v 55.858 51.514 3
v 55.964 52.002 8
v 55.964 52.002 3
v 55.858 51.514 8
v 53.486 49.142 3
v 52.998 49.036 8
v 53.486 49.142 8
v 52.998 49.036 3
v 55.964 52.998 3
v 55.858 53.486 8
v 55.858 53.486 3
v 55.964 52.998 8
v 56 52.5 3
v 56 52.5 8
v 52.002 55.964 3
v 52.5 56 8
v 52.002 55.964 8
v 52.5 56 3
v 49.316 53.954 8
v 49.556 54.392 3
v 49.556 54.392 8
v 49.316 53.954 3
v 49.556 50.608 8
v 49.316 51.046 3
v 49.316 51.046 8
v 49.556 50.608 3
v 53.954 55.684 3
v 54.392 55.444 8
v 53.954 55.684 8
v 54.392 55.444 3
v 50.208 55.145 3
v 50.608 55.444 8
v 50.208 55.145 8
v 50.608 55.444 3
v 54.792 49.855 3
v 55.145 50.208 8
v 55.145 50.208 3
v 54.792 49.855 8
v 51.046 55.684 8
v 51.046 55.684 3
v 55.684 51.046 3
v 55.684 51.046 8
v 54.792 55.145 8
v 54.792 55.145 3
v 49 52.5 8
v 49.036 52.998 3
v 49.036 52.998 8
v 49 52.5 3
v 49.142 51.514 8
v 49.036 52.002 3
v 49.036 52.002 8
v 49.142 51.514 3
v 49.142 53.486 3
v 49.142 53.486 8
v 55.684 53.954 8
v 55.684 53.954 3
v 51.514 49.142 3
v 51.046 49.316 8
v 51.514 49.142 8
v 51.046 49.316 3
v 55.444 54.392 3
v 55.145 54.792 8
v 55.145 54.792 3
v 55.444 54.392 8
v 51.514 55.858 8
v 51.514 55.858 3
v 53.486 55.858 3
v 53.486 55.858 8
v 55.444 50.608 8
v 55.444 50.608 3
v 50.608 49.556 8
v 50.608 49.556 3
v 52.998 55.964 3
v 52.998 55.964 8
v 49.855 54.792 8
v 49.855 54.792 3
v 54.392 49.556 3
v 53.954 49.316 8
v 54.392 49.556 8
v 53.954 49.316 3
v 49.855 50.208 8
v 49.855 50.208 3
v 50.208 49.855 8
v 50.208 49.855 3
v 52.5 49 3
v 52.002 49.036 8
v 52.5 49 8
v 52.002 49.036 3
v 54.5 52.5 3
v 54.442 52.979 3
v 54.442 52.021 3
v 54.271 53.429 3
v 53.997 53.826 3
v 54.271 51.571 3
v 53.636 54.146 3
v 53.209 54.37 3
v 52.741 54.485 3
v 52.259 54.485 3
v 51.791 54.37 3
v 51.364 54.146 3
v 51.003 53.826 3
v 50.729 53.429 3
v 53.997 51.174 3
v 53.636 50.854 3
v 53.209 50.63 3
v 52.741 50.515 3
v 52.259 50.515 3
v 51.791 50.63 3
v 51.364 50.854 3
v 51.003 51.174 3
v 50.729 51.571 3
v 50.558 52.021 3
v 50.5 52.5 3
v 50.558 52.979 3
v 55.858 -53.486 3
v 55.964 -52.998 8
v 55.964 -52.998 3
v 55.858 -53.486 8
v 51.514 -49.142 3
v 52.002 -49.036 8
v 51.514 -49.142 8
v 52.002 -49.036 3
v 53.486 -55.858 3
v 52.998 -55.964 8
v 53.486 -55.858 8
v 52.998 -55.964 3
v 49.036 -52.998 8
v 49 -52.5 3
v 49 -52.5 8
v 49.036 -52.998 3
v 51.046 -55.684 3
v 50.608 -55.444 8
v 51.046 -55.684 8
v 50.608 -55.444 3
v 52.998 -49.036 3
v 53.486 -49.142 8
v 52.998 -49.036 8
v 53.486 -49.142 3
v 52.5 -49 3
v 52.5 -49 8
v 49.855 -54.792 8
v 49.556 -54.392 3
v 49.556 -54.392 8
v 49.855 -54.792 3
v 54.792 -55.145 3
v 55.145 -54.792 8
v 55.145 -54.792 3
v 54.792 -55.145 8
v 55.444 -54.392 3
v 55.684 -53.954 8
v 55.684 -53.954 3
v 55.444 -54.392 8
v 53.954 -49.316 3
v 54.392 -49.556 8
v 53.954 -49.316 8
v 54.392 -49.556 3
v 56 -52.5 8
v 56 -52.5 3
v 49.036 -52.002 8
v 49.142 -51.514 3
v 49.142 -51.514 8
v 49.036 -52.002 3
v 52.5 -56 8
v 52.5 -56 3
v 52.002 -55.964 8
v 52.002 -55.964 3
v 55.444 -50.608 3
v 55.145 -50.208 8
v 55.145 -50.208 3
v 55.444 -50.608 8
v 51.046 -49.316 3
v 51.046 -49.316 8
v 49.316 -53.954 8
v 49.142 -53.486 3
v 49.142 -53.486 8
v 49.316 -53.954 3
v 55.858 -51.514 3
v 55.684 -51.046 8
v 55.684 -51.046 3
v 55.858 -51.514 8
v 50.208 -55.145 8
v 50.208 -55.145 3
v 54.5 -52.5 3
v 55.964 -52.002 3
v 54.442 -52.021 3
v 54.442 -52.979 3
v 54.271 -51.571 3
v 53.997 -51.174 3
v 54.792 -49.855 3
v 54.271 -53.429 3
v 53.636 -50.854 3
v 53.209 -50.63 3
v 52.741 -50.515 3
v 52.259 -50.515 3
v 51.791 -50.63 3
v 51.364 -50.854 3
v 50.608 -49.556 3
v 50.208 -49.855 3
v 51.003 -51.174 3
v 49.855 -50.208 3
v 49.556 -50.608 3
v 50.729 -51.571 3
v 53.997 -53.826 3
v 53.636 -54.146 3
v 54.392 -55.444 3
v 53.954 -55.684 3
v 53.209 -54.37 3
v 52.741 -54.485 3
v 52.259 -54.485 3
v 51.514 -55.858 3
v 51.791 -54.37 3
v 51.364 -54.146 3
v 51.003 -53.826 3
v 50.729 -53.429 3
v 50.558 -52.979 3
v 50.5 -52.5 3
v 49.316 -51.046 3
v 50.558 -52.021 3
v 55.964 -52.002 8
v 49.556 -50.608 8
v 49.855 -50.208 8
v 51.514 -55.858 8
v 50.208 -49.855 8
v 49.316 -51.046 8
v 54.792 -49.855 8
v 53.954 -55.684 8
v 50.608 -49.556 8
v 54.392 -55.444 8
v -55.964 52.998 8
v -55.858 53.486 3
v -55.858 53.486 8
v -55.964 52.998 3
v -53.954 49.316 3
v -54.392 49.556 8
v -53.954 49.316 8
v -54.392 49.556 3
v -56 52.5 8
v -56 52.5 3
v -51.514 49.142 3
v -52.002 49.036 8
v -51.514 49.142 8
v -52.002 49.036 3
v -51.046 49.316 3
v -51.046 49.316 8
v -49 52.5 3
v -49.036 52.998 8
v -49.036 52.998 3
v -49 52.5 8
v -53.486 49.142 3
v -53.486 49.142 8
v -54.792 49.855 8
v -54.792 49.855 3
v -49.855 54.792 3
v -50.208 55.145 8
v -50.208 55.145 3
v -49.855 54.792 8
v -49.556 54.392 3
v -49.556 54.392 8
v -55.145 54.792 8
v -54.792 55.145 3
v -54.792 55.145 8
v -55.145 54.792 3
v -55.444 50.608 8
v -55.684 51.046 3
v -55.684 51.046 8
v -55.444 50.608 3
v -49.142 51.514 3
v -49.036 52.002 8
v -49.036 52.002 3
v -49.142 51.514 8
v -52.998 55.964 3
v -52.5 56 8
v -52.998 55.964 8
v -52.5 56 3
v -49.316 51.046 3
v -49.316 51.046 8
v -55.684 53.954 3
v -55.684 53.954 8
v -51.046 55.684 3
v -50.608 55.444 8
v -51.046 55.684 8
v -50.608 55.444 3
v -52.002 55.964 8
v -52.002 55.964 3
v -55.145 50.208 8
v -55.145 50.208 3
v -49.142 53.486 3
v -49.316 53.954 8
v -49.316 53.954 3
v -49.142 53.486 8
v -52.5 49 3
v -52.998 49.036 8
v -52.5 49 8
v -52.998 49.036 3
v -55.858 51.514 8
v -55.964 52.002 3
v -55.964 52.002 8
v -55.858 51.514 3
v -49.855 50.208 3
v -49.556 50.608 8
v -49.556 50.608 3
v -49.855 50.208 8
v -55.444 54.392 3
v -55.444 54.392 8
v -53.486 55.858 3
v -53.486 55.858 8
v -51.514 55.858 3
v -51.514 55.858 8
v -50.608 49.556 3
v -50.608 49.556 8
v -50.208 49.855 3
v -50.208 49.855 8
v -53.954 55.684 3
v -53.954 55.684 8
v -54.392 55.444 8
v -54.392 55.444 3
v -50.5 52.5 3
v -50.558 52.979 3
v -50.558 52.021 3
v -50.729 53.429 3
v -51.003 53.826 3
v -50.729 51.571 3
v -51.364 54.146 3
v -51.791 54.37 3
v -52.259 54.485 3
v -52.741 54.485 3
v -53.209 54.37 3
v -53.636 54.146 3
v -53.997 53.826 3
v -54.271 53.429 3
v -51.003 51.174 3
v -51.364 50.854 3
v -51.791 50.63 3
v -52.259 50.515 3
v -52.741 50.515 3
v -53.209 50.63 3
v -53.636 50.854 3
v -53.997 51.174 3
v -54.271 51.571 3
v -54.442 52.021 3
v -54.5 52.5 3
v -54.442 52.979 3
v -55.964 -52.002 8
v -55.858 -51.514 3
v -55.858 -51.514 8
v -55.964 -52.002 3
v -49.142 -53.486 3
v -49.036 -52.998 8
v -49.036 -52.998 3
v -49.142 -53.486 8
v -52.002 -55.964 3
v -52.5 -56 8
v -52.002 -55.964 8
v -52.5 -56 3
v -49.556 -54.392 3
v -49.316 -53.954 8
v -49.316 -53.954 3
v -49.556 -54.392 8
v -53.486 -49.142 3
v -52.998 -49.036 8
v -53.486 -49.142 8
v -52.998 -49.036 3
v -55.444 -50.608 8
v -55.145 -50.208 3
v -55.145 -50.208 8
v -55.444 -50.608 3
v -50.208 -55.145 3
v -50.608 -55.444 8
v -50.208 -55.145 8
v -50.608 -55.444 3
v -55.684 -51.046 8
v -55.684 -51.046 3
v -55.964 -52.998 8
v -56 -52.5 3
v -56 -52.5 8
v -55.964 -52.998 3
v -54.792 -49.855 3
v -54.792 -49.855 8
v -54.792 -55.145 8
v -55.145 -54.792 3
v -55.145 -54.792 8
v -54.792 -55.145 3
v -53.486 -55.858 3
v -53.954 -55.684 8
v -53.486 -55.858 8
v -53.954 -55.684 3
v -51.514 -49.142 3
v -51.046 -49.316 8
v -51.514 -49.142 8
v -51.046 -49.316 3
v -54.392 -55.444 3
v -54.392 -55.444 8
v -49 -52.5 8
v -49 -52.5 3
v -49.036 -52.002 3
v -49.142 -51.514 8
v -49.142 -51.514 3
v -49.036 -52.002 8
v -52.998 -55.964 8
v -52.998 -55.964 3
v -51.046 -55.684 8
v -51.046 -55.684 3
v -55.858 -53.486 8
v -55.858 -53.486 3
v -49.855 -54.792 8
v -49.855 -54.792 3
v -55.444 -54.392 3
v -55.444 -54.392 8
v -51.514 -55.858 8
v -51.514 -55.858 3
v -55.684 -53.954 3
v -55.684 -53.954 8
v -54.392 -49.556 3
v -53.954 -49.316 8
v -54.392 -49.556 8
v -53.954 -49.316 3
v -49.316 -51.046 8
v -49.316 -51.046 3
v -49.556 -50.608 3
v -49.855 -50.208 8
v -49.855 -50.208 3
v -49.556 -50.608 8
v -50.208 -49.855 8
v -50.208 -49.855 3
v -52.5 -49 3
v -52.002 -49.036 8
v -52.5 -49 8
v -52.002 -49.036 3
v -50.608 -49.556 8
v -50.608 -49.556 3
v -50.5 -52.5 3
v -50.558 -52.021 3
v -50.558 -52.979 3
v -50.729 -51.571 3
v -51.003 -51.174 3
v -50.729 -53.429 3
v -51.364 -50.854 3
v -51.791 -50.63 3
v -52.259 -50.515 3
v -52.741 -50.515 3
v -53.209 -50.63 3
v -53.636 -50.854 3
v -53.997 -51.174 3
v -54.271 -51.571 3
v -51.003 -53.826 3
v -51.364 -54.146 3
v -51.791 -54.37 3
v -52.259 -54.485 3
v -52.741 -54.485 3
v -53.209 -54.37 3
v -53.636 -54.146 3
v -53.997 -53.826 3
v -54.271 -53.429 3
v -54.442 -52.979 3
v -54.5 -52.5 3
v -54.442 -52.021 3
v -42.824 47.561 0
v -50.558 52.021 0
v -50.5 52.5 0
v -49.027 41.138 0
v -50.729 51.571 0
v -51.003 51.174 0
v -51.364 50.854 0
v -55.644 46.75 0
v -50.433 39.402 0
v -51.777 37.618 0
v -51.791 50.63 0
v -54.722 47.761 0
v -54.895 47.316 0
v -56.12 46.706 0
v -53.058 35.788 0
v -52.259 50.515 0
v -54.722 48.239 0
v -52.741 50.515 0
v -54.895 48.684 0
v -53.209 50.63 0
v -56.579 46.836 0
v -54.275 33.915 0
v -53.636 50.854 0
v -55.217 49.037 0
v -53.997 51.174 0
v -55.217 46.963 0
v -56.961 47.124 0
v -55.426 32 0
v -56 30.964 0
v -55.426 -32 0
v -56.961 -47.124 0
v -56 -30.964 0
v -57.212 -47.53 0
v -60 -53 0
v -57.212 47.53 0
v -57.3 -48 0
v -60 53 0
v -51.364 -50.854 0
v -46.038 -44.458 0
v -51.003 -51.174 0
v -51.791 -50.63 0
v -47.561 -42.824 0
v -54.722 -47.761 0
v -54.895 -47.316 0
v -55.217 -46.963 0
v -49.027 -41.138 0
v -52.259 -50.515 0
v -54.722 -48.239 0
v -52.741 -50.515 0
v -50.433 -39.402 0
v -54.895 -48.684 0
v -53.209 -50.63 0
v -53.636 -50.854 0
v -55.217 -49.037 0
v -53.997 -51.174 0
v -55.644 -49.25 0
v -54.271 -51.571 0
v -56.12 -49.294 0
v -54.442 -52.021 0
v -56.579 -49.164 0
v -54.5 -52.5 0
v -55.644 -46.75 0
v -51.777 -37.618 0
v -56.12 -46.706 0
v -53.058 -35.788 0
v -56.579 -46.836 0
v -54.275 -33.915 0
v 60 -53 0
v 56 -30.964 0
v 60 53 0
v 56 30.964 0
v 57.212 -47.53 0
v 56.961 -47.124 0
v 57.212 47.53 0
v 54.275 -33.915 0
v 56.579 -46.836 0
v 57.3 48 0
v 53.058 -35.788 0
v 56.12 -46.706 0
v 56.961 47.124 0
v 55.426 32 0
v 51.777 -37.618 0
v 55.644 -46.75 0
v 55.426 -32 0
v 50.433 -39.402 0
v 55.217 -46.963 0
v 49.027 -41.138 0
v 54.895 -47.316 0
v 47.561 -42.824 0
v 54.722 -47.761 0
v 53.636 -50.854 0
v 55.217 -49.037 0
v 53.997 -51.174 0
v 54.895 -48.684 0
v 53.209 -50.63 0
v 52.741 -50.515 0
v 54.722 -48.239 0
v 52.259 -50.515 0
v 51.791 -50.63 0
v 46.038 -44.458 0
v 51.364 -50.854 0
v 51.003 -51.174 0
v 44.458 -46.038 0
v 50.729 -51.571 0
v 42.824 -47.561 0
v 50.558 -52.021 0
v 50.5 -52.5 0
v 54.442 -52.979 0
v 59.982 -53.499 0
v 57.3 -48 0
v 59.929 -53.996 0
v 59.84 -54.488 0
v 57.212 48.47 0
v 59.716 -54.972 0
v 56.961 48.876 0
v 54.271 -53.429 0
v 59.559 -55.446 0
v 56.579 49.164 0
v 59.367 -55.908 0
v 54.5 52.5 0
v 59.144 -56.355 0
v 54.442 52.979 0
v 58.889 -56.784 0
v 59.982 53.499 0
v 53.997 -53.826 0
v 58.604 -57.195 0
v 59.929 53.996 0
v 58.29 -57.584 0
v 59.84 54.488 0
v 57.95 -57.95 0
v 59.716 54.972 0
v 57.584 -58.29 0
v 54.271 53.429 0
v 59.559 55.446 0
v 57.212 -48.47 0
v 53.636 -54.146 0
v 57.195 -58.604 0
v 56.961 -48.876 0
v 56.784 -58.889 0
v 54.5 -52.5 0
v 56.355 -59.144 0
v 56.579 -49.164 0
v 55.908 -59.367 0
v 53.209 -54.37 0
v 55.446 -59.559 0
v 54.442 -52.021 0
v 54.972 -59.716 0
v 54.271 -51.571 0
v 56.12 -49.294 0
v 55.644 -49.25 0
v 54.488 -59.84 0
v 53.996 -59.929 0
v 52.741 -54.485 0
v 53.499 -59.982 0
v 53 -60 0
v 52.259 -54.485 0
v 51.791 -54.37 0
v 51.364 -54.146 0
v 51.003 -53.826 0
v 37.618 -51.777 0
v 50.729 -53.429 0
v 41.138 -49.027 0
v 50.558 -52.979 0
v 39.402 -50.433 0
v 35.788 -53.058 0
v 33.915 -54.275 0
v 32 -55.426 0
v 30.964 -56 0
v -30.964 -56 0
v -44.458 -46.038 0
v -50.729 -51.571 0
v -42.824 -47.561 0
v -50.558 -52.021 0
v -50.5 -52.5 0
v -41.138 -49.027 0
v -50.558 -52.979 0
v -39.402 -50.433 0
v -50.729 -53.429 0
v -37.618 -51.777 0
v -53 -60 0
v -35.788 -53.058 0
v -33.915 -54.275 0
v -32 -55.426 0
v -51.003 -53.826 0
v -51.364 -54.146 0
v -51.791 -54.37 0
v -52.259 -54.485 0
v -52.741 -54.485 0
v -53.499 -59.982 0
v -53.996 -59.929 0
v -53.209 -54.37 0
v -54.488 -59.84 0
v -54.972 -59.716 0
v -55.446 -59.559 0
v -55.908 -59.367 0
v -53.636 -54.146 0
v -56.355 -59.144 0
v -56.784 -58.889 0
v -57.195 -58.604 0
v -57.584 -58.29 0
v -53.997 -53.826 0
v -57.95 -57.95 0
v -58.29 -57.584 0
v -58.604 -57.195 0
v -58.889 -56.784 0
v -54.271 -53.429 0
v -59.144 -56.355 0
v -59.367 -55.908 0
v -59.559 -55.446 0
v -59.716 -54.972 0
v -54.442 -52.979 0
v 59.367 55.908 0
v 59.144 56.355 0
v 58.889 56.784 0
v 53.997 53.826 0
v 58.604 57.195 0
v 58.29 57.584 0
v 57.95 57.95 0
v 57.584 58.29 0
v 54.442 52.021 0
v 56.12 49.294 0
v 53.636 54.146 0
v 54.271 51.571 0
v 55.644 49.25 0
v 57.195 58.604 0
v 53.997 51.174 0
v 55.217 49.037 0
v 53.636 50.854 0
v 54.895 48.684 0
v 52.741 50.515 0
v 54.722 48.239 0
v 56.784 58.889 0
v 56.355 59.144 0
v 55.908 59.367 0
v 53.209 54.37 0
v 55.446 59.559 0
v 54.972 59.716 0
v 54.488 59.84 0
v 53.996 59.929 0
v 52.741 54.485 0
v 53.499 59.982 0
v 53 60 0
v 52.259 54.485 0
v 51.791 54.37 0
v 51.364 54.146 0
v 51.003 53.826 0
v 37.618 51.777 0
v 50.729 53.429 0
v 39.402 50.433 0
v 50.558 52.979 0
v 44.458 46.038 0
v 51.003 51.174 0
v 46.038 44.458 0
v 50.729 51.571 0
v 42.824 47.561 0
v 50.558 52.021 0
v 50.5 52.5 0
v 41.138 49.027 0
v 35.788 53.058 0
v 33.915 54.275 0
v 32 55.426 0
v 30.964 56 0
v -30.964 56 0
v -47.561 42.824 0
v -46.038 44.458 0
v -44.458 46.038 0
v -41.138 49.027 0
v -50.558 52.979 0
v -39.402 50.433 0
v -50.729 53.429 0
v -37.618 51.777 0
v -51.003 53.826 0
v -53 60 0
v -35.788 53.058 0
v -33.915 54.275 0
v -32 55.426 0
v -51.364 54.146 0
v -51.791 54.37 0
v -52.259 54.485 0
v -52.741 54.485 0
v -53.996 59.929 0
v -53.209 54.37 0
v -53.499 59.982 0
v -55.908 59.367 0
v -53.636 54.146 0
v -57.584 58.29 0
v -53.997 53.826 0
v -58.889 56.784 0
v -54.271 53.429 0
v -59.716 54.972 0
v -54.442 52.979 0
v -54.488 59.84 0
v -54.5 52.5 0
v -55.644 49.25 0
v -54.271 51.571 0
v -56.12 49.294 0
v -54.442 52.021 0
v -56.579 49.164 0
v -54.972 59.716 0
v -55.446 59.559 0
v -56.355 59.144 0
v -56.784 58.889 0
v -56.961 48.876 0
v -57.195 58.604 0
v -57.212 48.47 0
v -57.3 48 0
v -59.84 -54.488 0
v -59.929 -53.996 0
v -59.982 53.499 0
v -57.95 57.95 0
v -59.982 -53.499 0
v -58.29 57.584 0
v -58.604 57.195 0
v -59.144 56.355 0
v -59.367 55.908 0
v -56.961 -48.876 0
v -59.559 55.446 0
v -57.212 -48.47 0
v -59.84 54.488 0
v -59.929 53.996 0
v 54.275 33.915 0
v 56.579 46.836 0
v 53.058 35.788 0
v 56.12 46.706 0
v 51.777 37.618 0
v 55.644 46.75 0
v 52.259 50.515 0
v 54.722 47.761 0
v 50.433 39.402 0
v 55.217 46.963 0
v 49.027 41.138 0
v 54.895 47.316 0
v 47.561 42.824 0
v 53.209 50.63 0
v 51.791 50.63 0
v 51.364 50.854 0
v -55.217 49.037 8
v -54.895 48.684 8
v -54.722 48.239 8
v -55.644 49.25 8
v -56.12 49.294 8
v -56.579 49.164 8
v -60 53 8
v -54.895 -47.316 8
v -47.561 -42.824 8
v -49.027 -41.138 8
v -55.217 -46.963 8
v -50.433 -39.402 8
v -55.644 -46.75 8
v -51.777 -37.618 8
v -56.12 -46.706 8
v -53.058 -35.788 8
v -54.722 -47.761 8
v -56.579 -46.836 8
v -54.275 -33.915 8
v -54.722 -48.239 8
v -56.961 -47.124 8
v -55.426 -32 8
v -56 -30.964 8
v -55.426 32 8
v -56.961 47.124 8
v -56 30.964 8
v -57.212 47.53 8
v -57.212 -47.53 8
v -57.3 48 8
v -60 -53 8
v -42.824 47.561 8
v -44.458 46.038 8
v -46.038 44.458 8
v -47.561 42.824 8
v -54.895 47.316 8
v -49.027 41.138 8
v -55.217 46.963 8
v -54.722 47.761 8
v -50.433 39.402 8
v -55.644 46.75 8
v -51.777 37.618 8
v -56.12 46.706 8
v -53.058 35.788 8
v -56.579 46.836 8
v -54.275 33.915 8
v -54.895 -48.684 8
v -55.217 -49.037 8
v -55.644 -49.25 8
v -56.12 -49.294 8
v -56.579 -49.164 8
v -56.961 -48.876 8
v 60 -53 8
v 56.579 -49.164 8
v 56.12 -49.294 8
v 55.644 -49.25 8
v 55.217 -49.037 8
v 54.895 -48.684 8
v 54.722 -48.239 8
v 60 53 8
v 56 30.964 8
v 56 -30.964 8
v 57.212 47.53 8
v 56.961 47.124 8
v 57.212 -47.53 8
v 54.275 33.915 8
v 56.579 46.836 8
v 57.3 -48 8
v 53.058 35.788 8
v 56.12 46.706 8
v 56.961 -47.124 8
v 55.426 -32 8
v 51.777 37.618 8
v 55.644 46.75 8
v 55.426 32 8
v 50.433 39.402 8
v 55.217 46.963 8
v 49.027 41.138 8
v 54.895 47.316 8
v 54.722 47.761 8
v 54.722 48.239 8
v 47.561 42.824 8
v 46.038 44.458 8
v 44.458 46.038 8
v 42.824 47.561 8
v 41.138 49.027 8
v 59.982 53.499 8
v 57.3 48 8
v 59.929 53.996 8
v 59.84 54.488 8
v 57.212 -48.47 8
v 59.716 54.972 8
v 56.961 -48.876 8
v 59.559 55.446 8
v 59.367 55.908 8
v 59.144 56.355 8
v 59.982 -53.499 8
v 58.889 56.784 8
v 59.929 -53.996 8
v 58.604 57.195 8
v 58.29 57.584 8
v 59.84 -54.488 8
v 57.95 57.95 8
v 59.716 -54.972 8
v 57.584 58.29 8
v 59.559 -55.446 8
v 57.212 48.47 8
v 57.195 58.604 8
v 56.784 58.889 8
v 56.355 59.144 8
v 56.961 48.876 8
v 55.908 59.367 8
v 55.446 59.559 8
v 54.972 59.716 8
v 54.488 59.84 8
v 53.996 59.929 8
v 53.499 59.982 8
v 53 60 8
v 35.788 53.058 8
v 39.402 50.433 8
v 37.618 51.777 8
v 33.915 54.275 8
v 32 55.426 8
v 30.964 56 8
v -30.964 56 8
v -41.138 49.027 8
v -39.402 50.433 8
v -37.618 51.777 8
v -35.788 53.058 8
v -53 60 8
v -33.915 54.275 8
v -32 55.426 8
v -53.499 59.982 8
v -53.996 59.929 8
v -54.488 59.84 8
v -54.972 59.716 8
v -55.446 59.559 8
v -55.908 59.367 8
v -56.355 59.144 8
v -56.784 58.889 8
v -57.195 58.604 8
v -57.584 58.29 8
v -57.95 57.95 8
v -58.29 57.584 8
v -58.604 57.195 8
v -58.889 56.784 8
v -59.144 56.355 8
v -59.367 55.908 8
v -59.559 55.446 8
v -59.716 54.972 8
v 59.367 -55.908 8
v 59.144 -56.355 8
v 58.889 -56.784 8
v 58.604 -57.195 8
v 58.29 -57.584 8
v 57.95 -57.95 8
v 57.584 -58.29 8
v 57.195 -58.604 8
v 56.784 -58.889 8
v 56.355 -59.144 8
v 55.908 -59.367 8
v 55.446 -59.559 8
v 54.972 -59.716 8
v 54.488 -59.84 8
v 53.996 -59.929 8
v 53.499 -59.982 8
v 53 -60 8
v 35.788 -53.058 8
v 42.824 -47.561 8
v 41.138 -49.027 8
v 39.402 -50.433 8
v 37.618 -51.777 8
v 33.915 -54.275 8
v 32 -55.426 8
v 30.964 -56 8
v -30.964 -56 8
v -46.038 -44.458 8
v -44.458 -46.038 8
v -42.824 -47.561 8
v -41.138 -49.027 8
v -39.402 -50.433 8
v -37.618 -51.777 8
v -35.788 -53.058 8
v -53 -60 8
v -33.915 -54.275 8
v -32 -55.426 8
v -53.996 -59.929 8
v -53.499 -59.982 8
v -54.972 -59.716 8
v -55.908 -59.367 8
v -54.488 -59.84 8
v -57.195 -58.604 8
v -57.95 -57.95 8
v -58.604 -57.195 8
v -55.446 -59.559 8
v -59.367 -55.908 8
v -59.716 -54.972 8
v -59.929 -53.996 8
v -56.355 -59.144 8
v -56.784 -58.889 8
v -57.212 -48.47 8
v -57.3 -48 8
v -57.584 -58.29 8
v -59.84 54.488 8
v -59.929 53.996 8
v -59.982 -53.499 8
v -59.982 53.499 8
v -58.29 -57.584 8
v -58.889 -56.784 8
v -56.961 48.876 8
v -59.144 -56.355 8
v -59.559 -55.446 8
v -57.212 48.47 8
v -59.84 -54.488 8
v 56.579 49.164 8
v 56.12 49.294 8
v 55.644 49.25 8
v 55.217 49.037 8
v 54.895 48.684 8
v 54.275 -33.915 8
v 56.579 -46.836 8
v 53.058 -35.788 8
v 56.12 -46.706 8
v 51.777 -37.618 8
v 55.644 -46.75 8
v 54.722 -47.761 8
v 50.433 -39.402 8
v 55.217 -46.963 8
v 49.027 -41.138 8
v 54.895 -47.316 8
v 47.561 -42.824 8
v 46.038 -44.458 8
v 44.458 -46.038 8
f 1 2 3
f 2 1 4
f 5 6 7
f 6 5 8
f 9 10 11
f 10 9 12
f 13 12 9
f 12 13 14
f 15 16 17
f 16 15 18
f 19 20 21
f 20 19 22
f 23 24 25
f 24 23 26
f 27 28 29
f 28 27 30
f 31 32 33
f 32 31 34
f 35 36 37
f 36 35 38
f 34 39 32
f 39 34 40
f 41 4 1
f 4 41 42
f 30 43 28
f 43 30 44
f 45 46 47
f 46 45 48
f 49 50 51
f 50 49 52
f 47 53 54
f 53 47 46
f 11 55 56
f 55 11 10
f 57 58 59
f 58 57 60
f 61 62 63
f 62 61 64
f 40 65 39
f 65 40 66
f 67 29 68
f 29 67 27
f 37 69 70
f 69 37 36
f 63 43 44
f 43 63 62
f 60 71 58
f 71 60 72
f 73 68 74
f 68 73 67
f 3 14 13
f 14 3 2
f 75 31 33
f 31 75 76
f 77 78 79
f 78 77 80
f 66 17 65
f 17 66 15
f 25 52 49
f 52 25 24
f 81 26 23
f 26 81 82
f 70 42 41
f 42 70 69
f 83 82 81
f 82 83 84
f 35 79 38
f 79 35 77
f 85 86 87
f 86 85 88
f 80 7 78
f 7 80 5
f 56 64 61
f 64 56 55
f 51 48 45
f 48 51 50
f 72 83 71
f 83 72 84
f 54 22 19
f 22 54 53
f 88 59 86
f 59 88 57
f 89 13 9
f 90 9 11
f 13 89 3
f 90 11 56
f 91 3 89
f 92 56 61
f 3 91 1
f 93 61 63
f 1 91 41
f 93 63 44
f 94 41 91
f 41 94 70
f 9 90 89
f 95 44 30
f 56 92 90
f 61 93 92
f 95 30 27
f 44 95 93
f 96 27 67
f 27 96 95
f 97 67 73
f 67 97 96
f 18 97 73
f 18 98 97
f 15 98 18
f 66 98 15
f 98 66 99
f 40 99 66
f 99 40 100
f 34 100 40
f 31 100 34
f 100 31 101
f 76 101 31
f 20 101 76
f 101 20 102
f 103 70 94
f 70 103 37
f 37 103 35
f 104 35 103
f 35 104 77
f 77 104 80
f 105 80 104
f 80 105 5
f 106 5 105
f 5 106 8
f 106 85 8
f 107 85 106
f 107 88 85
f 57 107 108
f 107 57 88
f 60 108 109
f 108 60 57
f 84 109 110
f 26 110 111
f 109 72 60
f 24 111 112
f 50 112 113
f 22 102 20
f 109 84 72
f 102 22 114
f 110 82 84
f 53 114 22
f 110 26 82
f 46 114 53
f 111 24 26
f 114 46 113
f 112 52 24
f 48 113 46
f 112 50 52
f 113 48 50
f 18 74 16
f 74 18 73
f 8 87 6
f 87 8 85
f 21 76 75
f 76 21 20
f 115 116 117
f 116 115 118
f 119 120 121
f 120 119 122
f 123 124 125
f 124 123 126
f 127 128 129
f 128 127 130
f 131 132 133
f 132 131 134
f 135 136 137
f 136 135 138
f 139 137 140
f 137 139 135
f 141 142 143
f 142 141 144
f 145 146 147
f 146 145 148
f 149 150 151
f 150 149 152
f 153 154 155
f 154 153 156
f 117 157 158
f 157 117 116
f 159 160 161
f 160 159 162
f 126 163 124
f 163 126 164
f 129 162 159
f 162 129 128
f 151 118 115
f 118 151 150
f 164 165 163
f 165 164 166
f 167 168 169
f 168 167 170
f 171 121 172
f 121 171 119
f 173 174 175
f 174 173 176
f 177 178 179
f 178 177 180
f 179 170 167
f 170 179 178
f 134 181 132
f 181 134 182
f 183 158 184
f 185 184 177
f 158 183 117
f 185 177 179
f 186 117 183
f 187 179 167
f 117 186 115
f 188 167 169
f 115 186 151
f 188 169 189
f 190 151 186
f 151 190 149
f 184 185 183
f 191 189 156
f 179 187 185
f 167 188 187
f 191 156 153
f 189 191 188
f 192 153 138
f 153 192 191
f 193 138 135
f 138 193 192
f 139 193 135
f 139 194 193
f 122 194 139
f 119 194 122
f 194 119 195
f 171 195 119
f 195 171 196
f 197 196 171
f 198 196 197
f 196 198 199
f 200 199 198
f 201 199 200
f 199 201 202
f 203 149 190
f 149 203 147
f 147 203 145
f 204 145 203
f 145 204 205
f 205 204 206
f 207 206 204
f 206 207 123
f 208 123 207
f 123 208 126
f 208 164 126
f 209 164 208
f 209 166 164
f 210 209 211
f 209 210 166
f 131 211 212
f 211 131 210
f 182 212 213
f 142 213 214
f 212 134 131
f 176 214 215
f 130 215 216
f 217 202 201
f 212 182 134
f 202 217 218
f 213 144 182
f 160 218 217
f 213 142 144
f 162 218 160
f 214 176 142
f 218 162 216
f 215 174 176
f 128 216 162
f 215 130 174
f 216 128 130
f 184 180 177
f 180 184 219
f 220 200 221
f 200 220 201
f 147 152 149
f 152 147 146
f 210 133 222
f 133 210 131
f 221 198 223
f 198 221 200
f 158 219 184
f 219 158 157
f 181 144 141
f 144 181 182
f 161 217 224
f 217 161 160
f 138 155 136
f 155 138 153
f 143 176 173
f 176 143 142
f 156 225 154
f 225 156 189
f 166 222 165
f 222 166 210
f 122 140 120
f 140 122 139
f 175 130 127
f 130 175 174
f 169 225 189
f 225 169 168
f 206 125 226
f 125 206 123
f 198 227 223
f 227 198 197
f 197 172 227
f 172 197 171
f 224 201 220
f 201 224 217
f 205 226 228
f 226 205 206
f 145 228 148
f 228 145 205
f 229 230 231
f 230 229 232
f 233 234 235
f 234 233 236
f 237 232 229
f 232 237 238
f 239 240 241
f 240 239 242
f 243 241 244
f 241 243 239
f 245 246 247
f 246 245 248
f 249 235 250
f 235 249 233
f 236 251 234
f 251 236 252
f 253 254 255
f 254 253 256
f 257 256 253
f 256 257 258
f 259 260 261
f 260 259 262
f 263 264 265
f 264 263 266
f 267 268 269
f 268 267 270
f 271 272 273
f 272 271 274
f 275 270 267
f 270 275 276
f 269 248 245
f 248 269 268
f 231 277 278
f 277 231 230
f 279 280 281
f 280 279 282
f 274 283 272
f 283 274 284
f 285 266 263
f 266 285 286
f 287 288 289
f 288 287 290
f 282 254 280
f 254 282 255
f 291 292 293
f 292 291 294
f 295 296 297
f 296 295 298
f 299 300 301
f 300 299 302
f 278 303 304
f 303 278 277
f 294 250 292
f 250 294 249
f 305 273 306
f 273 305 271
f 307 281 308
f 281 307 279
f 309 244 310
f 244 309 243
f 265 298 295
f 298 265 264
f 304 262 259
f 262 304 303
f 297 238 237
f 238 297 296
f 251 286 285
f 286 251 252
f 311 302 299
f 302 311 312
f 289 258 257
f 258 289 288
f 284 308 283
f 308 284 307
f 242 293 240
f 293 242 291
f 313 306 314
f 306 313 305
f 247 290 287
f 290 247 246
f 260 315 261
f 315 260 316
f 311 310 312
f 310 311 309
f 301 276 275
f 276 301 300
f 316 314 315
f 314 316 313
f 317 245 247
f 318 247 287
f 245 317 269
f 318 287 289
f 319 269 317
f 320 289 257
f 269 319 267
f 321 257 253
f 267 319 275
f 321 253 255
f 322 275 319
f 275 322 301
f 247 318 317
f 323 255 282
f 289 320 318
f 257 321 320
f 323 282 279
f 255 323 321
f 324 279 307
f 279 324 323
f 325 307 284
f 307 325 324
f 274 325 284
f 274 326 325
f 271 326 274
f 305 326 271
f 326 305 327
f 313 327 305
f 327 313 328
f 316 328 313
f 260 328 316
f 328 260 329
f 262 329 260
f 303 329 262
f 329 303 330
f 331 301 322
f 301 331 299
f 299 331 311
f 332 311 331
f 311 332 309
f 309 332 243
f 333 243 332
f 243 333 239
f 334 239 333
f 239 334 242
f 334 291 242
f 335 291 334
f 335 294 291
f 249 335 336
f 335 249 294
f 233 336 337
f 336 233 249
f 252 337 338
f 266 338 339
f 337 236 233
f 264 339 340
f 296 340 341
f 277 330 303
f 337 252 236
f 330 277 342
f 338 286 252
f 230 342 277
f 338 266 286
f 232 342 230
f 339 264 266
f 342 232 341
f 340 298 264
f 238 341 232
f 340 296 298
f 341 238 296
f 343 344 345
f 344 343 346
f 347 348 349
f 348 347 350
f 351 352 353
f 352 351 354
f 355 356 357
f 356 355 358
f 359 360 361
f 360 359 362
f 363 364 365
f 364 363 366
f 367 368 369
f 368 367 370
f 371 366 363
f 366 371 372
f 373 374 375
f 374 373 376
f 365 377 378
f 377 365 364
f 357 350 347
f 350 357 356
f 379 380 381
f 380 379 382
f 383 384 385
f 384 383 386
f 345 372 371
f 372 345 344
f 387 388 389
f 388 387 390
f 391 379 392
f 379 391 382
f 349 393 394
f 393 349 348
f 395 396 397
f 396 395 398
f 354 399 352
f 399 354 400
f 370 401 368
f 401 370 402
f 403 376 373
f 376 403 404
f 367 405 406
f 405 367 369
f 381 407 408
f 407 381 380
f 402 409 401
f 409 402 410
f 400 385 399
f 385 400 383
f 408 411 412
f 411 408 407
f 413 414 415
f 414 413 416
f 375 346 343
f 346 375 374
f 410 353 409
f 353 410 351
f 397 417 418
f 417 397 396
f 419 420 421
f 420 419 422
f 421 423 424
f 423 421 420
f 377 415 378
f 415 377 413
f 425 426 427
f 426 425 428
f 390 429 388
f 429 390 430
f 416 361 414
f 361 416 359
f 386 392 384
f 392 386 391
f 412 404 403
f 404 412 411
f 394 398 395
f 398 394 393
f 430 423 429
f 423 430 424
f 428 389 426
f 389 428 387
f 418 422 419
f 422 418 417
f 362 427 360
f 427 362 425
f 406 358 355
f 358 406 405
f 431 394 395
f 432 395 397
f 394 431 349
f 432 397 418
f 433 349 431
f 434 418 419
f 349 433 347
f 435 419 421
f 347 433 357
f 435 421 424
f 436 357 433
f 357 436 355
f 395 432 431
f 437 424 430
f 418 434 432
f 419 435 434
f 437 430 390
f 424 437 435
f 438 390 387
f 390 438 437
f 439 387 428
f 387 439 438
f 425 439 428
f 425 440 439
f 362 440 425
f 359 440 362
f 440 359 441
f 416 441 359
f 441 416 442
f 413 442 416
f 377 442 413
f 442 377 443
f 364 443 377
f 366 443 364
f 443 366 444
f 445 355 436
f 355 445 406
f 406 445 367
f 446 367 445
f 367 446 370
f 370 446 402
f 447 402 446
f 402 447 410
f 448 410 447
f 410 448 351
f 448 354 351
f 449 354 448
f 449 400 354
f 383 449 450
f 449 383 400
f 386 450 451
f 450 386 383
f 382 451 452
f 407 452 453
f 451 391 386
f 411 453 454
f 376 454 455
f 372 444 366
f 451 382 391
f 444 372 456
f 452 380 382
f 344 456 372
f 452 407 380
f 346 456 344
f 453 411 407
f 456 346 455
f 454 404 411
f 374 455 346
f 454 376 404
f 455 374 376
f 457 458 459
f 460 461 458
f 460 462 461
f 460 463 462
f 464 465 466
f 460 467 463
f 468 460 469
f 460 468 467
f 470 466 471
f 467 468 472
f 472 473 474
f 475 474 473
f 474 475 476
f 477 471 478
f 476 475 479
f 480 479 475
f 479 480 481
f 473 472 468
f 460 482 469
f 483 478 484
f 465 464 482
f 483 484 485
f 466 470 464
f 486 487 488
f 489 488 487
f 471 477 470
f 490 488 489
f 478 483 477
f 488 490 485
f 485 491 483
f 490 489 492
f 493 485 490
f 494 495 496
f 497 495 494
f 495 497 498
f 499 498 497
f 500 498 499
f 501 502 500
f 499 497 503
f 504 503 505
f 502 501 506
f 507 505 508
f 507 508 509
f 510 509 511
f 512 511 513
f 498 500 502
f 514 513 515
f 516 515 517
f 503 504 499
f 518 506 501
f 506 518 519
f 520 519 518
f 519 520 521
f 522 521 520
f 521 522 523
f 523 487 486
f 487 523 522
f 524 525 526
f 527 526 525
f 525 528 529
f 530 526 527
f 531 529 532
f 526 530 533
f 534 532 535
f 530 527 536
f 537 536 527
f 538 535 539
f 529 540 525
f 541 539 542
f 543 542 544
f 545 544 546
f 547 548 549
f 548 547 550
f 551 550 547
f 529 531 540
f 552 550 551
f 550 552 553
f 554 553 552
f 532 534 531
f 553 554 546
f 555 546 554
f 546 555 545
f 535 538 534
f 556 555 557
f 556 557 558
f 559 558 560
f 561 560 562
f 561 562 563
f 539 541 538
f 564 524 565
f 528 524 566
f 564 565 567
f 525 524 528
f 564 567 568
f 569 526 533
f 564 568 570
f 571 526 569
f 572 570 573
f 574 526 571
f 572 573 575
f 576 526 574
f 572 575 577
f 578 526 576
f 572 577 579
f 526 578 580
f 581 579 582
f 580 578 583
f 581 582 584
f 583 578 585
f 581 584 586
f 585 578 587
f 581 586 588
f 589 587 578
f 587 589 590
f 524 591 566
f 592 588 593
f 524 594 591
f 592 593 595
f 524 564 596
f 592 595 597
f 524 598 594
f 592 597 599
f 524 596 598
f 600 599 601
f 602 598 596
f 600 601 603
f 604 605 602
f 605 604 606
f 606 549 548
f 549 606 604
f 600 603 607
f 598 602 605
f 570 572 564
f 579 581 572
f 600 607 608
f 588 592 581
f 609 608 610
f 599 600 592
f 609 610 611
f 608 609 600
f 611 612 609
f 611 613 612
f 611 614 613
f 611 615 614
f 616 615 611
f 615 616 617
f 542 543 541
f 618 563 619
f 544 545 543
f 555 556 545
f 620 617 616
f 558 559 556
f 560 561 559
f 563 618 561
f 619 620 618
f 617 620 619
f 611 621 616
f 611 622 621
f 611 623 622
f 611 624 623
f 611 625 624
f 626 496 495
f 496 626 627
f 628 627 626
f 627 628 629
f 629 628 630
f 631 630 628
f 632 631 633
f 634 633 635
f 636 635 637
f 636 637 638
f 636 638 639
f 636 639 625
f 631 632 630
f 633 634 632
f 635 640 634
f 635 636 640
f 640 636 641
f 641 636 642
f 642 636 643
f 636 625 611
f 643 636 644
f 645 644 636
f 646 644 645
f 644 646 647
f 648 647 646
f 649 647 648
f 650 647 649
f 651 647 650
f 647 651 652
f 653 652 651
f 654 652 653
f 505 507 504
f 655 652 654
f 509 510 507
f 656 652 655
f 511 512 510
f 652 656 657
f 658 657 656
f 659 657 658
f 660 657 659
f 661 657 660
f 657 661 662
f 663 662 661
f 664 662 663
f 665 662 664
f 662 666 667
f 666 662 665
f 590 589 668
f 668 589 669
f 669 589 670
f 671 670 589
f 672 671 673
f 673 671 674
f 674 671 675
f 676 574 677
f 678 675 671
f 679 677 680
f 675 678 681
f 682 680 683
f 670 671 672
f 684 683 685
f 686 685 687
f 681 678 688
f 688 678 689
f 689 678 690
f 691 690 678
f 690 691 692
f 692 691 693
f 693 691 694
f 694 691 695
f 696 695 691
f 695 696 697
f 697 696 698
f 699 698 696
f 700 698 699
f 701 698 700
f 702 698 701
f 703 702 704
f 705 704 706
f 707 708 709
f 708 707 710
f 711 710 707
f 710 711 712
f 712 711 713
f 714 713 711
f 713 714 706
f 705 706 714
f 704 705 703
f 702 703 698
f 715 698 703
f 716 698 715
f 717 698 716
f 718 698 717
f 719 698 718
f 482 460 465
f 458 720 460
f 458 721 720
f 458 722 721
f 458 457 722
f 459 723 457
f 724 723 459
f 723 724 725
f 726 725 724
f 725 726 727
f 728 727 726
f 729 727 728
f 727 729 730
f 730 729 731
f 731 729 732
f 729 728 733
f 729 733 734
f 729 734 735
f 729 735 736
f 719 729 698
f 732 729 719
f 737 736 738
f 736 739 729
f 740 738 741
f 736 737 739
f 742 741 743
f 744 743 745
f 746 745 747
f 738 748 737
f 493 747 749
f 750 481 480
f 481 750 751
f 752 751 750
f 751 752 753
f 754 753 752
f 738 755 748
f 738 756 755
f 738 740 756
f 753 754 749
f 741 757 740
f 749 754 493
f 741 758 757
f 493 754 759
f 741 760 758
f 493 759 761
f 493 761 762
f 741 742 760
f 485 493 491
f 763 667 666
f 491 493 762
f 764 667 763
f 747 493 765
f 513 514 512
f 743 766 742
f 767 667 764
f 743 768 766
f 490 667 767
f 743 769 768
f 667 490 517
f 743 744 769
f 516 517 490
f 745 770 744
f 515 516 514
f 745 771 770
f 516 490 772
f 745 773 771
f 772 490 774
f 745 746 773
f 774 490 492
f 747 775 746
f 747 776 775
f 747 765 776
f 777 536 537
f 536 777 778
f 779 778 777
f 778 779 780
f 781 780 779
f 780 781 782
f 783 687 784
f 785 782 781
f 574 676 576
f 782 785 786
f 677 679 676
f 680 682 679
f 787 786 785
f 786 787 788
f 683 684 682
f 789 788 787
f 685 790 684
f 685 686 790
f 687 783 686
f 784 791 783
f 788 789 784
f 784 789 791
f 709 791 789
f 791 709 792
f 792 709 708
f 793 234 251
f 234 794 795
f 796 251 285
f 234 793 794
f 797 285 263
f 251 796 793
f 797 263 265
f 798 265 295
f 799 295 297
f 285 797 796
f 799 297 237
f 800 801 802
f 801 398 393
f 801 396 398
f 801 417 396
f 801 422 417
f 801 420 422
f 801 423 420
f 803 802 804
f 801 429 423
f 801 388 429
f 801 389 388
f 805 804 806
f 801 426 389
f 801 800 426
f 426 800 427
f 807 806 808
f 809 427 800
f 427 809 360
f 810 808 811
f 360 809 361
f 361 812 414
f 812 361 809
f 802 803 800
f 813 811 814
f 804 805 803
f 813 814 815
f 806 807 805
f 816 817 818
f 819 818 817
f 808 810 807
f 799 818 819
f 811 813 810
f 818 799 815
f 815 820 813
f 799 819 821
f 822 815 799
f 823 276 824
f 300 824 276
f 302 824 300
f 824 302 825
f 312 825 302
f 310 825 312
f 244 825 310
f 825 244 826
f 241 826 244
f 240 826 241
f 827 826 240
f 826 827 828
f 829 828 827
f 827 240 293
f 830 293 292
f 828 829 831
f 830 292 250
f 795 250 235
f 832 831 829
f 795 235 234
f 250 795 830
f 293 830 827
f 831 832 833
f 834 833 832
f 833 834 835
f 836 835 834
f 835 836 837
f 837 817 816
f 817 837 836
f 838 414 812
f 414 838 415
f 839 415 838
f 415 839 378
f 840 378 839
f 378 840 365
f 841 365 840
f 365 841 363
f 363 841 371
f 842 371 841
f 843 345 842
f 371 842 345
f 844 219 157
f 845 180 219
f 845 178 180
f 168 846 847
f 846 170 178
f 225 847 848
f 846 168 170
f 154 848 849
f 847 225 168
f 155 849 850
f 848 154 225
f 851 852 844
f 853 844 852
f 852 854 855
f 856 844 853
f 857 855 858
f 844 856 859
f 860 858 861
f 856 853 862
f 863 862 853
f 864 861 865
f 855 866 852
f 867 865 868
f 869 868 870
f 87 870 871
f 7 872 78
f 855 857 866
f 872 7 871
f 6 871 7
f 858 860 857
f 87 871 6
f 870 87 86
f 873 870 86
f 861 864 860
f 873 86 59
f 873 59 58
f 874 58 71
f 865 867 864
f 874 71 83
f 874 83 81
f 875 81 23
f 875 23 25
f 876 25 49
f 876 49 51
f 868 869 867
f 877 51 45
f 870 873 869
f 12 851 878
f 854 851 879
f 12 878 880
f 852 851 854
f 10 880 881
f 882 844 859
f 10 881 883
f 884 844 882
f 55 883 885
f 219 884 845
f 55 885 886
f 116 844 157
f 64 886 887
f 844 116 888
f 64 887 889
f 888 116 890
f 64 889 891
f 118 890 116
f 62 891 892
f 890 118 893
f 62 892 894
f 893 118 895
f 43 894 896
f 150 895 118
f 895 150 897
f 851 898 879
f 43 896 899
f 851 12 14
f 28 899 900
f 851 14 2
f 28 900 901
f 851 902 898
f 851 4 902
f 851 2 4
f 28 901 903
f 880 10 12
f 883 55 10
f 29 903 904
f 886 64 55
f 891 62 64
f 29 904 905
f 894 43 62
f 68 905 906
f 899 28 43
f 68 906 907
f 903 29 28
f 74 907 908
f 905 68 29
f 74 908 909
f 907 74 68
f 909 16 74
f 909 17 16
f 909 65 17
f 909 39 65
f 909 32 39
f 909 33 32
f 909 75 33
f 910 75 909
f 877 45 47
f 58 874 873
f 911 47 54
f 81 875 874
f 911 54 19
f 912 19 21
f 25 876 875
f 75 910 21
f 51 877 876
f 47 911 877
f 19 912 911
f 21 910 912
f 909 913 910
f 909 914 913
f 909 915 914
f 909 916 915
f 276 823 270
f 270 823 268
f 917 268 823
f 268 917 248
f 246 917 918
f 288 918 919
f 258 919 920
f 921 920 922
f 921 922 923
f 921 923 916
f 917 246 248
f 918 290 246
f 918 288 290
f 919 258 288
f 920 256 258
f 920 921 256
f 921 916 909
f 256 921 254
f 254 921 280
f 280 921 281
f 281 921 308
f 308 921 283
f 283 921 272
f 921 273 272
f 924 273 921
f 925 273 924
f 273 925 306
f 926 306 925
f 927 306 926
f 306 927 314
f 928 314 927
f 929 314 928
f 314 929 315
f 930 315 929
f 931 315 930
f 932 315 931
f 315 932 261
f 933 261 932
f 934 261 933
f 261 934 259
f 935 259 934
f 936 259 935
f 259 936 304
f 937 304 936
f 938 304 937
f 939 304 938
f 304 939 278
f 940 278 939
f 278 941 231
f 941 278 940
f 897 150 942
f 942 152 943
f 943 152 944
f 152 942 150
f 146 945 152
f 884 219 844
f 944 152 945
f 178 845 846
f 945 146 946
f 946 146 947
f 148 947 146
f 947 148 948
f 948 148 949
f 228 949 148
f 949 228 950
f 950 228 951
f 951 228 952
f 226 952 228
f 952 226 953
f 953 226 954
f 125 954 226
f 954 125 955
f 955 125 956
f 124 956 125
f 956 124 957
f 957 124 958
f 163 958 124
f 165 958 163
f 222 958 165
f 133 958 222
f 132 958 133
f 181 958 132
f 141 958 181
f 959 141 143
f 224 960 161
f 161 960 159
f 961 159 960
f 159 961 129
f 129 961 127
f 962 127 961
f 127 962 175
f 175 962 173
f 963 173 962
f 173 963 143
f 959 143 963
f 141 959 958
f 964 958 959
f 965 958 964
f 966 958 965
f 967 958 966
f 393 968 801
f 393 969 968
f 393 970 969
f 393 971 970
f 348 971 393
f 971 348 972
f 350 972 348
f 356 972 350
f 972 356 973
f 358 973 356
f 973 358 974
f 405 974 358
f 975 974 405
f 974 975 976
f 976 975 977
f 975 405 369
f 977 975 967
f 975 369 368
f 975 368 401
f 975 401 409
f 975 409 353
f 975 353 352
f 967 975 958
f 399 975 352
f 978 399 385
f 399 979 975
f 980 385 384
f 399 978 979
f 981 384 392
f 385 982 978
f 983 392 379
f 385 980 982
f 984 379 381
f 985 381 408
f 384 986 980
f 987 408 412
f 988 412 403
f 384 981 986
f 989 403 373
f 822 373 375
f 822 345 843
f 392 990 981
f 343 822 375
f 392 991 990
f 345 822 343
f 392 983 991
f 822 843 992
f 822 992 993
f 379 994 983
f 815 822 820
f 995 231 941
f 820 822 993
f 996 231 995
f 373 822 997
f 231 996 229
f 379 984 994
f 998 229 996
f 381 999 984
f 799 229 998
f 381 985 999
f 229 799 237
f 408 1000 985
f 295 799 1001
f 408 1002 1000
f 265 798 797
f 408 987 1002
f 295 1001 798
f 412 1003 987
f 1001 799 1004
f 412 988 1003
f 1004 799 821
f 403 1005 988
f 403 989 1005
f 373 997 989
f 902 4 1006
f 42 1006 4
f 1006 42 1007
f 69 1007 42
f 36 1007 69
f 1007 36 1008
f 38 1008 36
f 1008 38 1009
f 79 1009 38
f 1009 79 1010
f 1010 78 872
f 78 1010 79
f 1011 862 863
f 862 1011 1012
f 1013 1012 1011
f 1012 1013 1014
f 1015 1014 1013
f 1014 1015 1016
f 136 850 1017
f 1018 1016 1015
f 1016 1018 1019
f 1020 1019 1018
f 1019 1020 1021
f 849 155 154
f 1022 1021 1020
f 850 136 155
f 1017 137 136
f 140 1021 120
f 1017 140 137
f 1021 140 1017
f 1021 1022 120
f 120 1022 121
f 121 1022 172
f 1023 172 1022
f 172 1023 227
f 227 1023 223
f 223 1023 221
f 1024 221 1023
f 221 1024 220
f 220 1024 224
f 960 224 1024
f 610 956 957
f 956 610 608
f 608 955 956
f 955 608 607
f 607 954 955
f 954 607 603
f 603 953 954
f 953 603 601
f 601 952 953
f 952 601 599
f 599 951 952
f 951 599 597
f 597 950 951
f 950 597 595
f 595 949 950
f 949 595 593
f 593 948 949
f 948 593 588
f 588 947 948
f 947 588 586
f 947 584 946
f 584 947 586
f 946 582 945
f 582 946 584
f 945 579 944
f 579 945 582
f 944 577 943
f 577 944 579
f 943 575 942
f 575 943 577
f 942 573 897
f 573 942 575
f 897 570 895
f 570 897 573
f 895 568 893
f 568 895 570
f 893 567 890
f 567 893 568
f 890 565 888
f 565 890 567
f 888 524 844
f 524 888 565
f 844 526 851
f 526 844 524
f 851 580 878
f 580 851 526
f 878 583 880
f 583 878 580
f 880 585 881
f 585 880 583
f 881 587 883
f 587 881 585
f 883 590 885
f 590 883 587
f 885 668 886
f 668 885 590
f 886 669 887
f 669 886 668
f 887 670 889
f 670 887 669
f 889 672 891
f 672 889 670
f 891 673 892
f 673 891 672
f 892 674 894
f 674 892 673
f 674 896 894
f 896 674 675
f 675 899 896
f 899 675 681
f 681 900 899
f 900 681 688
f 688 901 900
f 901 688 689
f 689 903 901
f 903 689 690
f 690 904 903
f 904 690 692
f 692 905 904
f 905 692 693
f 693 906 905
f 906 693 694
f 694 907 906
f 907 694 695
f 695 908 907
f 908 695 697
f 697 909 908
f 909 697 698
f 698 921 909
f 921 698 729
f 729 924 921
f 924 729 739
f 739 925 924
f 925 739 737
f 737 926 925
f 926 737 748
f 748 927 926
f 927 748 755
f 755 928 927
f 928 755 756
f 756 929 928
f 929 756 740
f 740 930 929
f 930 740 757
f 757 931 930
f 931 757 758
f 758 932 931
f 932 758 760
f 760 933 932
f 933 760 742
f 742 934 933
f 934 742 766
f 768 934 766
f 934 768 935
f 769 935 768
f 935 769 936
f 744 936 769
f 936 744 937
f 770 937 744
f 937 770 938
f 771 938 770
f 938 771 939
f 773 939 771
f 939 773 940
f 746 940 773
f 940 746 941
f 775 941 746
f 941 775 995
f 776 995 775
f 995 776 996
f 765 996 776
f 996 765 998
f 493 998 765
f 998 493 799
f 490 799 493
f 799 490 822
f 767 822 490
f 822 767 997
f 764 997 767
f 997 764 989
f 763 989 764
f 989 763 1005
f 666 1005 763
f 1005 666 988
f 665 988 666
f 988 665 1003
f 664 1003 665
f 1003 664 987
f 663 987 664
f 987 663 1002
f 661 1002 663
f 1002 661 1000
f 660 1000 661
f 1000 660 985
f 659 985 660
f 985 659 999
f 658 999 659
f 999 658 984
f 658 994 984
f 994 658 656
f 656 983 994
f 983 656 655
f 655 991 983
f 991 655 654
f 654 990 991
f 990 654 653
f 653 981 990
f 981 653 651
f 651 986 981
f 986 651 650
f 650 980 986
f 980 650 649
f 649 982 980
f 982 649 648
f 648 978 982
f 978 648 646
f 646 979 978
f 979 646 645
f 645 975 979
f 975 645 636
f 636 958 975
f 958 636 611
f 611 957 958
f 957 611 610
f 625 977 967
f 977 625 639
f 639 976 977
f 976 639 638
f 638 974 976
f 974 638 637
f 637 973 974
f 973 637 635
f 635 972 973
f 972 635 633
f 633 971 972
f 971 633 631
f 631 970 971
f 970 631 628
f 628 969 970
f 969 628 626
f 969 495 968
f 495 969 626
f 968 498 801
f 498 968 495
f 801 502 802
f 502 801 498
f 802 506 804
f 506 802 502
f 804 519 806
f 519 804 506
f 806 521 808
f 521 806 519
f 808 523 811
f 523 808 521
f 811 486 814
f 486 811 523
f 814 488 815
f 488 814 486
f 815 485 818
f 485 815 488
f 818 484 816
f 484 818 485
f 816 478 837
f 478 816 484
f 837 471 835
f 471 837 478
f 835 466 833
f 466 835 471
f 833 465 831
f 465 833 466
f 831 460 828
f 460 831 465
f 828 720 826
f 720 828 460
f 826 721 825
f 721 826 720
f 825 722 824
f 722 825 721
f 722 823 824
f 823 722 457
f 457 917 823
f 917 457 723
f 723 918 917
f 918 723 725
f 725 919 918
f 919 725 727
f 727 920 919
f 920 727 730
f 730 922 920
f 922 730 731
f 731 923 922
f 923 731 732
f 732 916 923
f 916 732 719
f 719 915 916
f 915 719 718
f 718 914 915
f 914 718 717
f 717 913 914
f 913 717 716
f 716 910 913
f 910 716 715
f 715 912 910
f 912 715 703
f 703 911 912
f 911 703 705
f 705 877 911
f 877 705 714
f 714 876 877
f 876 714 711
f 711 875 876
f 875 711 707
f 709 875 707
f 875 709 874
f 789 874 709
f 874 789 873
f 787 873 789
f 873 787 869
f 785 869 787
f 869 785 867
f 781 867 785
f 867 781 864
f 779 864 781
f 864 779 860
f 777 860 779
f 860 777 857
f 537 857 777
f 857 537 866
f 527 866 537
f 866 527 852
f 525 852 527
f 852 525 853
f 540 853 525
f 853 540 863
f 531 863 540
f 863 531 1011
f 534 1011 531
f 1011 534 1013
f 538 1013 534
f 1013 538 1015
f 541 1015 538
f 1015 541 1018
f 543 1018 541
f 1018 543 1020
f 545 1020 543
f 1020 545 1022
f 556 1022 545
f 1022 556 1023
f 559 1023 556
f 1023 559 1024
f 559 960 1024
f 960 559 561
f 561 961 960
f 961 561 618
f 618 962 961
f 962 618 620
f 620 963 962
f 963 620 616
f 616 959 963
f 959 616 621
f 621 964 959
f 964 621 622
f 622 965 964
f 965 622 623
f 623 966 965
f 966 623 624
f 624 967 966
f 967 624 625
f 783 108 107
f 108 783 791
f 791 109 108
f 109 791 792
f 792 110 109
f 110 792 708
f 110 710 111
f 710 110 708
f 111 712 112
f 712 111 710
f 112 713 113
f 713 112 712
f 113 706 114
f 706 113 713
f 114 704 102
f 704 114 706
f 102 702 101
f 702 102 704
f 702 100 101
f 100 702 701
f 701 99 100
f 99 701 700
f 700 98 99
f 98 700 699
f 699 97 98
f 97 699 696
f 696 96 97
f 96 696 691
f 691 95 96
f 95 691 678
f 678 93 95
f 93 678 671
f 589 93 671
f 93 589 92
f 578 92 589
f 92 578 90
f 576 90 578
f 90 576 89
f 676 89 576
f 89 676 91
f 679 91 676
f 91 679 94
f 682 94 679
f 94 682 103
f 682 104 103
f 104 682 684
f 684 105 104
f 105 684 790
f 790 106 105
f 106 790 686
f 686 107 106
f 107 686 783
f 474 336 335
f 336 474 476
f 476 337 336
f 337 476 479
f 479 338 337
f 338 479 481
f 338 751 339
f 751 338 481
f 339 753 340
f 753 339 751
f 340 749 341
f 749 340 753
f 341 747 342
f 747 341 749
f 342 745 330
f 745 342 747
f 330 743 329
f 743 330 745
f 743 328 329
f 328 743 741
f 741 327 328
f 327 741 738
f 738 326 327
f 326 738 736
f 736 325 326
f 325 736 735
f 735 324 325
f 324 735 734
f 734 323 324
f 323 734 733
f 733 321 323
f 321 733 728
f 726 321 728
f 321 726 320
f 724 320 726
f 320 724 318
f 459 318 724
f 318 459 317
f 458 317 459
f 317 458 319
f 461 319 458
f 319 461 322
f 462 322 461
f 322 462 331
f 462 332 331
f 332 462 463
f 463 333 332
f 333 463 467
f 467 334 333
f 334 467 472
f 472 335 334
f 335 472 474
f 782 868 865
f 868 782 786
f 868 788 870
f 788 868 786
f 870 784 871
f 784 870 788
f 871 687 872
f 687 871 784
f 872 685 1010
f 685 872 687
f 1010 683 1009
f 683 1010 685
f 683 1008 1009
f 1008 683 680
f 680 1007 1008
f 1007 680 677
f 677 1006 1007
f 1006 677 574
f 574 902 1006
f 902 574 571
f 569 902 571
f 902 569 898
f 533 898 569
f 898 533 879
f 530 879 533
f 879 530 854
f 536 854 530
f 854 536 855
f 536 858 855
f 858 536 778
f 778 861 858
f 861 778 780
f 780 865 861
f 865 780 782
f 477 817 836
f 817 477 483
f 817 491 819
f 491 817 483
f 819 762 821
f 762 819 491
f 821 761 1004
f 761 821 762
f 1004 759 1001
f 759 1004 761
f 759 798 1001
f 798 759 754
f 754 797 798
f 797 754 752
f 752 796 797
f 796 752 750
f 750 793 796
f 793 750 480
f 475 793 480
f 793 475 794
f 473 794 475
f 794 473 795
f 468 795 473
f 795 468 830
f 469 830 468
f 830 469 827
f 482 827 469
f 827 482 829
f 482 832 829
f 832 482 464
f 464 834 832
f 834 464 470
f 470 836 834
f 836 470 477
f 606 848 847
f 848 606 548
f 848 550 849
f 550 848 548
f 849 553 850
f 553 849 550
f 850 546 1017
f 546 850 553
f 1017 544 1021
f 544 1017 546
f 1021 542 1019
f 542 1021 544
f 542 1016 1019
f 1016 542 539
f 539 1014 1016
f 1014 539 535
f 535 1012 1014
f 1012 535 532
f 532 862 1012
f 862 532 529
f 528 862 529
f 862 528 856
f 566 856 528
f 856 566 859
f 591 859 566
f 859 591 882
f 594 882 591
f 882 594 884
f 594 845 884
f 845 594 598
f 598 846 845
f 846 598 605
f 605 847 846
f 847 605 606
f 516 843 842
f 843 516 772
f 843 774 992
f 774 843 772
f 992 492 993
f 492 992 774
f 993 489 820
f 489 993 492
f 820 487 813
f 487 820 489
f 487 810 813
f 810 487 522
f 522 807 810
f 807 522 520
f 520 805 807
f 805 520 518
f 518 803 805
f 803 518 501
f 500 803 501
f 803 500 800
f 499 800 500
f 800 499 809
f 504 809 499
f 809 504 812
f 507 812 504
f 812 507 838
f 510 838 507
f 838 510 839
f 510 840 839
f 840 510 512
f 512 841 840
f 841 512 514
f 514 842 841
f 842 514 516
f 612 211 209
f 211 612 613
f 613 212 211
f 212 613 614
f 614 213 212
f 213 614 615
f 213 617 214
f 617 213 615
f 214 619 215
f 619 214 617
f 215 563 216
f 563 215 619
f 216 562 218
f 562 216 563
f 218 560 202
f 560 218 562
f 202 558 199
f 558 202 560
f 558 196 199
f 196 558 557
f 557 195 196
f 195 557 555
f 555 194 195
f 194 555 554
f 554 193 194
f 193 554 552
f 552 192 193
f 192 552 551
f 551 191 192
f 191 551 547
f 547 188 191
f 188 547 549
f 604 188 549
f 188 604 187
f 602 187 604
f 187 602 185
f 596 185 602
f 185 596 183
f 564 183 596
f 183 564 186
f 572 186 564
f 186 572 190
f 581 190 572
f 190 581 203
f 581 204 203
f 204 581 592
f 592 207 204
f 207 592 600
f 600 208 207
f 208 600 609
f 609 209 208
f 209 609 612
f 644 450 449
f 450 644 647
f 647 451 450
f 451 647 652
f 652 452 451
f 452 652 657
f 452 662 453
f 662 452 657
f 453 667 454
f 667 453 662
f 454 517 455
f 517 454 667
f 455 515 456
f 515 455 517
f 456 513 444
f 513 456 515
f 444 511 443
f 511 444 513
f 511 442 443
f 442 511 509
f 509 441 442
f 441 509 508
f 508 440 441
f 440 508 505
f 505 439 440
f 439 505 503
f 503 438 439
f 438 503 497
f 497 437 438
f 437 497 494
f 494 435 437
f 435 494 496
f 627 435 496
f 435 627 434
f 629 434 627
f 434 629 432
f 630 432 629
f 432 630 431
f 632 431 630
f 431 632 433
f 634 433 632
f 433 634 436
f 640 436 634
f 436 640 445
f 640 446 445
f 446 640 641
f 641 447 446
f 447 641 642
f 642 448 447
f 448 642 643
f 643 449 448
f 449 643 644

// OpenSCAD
d1 = [112,96];
r1 = 7;
fm = 105/2;
fr = 120/2;

d2 = [fr-r1,fr-r1];

$fs = 0.5;
$fa = 2;

difference()
{
    linear_extrude(8) difference()
    {
        hull() for(i=[0,1], j = [0,1]) mirror([i,0]) mirror([0,j]) translate(d2) circle(r1);
        for(i=[0,1], j = [0,1]) mirror([i,0]) mirror([0,j]) translate(d1/2) circle(1.3);
        translate([0,0])
        {
            for(i=[0,1], j = [0,1]) mirror([i,0]) mirror([0,j]) translate([fm,fm]) circle(2);
            intersection()
            {
                circle(fr+4);
                square((fr-4)*2,center=true);
            }
            
        }

    }
    for(i=[0,1], j = [0,1]) mirror([i,0]) mirror([0,j]) translate([fm,fm,3]) cylinder(r=3.5,h=10);
}

//rs 6000 m type 35
